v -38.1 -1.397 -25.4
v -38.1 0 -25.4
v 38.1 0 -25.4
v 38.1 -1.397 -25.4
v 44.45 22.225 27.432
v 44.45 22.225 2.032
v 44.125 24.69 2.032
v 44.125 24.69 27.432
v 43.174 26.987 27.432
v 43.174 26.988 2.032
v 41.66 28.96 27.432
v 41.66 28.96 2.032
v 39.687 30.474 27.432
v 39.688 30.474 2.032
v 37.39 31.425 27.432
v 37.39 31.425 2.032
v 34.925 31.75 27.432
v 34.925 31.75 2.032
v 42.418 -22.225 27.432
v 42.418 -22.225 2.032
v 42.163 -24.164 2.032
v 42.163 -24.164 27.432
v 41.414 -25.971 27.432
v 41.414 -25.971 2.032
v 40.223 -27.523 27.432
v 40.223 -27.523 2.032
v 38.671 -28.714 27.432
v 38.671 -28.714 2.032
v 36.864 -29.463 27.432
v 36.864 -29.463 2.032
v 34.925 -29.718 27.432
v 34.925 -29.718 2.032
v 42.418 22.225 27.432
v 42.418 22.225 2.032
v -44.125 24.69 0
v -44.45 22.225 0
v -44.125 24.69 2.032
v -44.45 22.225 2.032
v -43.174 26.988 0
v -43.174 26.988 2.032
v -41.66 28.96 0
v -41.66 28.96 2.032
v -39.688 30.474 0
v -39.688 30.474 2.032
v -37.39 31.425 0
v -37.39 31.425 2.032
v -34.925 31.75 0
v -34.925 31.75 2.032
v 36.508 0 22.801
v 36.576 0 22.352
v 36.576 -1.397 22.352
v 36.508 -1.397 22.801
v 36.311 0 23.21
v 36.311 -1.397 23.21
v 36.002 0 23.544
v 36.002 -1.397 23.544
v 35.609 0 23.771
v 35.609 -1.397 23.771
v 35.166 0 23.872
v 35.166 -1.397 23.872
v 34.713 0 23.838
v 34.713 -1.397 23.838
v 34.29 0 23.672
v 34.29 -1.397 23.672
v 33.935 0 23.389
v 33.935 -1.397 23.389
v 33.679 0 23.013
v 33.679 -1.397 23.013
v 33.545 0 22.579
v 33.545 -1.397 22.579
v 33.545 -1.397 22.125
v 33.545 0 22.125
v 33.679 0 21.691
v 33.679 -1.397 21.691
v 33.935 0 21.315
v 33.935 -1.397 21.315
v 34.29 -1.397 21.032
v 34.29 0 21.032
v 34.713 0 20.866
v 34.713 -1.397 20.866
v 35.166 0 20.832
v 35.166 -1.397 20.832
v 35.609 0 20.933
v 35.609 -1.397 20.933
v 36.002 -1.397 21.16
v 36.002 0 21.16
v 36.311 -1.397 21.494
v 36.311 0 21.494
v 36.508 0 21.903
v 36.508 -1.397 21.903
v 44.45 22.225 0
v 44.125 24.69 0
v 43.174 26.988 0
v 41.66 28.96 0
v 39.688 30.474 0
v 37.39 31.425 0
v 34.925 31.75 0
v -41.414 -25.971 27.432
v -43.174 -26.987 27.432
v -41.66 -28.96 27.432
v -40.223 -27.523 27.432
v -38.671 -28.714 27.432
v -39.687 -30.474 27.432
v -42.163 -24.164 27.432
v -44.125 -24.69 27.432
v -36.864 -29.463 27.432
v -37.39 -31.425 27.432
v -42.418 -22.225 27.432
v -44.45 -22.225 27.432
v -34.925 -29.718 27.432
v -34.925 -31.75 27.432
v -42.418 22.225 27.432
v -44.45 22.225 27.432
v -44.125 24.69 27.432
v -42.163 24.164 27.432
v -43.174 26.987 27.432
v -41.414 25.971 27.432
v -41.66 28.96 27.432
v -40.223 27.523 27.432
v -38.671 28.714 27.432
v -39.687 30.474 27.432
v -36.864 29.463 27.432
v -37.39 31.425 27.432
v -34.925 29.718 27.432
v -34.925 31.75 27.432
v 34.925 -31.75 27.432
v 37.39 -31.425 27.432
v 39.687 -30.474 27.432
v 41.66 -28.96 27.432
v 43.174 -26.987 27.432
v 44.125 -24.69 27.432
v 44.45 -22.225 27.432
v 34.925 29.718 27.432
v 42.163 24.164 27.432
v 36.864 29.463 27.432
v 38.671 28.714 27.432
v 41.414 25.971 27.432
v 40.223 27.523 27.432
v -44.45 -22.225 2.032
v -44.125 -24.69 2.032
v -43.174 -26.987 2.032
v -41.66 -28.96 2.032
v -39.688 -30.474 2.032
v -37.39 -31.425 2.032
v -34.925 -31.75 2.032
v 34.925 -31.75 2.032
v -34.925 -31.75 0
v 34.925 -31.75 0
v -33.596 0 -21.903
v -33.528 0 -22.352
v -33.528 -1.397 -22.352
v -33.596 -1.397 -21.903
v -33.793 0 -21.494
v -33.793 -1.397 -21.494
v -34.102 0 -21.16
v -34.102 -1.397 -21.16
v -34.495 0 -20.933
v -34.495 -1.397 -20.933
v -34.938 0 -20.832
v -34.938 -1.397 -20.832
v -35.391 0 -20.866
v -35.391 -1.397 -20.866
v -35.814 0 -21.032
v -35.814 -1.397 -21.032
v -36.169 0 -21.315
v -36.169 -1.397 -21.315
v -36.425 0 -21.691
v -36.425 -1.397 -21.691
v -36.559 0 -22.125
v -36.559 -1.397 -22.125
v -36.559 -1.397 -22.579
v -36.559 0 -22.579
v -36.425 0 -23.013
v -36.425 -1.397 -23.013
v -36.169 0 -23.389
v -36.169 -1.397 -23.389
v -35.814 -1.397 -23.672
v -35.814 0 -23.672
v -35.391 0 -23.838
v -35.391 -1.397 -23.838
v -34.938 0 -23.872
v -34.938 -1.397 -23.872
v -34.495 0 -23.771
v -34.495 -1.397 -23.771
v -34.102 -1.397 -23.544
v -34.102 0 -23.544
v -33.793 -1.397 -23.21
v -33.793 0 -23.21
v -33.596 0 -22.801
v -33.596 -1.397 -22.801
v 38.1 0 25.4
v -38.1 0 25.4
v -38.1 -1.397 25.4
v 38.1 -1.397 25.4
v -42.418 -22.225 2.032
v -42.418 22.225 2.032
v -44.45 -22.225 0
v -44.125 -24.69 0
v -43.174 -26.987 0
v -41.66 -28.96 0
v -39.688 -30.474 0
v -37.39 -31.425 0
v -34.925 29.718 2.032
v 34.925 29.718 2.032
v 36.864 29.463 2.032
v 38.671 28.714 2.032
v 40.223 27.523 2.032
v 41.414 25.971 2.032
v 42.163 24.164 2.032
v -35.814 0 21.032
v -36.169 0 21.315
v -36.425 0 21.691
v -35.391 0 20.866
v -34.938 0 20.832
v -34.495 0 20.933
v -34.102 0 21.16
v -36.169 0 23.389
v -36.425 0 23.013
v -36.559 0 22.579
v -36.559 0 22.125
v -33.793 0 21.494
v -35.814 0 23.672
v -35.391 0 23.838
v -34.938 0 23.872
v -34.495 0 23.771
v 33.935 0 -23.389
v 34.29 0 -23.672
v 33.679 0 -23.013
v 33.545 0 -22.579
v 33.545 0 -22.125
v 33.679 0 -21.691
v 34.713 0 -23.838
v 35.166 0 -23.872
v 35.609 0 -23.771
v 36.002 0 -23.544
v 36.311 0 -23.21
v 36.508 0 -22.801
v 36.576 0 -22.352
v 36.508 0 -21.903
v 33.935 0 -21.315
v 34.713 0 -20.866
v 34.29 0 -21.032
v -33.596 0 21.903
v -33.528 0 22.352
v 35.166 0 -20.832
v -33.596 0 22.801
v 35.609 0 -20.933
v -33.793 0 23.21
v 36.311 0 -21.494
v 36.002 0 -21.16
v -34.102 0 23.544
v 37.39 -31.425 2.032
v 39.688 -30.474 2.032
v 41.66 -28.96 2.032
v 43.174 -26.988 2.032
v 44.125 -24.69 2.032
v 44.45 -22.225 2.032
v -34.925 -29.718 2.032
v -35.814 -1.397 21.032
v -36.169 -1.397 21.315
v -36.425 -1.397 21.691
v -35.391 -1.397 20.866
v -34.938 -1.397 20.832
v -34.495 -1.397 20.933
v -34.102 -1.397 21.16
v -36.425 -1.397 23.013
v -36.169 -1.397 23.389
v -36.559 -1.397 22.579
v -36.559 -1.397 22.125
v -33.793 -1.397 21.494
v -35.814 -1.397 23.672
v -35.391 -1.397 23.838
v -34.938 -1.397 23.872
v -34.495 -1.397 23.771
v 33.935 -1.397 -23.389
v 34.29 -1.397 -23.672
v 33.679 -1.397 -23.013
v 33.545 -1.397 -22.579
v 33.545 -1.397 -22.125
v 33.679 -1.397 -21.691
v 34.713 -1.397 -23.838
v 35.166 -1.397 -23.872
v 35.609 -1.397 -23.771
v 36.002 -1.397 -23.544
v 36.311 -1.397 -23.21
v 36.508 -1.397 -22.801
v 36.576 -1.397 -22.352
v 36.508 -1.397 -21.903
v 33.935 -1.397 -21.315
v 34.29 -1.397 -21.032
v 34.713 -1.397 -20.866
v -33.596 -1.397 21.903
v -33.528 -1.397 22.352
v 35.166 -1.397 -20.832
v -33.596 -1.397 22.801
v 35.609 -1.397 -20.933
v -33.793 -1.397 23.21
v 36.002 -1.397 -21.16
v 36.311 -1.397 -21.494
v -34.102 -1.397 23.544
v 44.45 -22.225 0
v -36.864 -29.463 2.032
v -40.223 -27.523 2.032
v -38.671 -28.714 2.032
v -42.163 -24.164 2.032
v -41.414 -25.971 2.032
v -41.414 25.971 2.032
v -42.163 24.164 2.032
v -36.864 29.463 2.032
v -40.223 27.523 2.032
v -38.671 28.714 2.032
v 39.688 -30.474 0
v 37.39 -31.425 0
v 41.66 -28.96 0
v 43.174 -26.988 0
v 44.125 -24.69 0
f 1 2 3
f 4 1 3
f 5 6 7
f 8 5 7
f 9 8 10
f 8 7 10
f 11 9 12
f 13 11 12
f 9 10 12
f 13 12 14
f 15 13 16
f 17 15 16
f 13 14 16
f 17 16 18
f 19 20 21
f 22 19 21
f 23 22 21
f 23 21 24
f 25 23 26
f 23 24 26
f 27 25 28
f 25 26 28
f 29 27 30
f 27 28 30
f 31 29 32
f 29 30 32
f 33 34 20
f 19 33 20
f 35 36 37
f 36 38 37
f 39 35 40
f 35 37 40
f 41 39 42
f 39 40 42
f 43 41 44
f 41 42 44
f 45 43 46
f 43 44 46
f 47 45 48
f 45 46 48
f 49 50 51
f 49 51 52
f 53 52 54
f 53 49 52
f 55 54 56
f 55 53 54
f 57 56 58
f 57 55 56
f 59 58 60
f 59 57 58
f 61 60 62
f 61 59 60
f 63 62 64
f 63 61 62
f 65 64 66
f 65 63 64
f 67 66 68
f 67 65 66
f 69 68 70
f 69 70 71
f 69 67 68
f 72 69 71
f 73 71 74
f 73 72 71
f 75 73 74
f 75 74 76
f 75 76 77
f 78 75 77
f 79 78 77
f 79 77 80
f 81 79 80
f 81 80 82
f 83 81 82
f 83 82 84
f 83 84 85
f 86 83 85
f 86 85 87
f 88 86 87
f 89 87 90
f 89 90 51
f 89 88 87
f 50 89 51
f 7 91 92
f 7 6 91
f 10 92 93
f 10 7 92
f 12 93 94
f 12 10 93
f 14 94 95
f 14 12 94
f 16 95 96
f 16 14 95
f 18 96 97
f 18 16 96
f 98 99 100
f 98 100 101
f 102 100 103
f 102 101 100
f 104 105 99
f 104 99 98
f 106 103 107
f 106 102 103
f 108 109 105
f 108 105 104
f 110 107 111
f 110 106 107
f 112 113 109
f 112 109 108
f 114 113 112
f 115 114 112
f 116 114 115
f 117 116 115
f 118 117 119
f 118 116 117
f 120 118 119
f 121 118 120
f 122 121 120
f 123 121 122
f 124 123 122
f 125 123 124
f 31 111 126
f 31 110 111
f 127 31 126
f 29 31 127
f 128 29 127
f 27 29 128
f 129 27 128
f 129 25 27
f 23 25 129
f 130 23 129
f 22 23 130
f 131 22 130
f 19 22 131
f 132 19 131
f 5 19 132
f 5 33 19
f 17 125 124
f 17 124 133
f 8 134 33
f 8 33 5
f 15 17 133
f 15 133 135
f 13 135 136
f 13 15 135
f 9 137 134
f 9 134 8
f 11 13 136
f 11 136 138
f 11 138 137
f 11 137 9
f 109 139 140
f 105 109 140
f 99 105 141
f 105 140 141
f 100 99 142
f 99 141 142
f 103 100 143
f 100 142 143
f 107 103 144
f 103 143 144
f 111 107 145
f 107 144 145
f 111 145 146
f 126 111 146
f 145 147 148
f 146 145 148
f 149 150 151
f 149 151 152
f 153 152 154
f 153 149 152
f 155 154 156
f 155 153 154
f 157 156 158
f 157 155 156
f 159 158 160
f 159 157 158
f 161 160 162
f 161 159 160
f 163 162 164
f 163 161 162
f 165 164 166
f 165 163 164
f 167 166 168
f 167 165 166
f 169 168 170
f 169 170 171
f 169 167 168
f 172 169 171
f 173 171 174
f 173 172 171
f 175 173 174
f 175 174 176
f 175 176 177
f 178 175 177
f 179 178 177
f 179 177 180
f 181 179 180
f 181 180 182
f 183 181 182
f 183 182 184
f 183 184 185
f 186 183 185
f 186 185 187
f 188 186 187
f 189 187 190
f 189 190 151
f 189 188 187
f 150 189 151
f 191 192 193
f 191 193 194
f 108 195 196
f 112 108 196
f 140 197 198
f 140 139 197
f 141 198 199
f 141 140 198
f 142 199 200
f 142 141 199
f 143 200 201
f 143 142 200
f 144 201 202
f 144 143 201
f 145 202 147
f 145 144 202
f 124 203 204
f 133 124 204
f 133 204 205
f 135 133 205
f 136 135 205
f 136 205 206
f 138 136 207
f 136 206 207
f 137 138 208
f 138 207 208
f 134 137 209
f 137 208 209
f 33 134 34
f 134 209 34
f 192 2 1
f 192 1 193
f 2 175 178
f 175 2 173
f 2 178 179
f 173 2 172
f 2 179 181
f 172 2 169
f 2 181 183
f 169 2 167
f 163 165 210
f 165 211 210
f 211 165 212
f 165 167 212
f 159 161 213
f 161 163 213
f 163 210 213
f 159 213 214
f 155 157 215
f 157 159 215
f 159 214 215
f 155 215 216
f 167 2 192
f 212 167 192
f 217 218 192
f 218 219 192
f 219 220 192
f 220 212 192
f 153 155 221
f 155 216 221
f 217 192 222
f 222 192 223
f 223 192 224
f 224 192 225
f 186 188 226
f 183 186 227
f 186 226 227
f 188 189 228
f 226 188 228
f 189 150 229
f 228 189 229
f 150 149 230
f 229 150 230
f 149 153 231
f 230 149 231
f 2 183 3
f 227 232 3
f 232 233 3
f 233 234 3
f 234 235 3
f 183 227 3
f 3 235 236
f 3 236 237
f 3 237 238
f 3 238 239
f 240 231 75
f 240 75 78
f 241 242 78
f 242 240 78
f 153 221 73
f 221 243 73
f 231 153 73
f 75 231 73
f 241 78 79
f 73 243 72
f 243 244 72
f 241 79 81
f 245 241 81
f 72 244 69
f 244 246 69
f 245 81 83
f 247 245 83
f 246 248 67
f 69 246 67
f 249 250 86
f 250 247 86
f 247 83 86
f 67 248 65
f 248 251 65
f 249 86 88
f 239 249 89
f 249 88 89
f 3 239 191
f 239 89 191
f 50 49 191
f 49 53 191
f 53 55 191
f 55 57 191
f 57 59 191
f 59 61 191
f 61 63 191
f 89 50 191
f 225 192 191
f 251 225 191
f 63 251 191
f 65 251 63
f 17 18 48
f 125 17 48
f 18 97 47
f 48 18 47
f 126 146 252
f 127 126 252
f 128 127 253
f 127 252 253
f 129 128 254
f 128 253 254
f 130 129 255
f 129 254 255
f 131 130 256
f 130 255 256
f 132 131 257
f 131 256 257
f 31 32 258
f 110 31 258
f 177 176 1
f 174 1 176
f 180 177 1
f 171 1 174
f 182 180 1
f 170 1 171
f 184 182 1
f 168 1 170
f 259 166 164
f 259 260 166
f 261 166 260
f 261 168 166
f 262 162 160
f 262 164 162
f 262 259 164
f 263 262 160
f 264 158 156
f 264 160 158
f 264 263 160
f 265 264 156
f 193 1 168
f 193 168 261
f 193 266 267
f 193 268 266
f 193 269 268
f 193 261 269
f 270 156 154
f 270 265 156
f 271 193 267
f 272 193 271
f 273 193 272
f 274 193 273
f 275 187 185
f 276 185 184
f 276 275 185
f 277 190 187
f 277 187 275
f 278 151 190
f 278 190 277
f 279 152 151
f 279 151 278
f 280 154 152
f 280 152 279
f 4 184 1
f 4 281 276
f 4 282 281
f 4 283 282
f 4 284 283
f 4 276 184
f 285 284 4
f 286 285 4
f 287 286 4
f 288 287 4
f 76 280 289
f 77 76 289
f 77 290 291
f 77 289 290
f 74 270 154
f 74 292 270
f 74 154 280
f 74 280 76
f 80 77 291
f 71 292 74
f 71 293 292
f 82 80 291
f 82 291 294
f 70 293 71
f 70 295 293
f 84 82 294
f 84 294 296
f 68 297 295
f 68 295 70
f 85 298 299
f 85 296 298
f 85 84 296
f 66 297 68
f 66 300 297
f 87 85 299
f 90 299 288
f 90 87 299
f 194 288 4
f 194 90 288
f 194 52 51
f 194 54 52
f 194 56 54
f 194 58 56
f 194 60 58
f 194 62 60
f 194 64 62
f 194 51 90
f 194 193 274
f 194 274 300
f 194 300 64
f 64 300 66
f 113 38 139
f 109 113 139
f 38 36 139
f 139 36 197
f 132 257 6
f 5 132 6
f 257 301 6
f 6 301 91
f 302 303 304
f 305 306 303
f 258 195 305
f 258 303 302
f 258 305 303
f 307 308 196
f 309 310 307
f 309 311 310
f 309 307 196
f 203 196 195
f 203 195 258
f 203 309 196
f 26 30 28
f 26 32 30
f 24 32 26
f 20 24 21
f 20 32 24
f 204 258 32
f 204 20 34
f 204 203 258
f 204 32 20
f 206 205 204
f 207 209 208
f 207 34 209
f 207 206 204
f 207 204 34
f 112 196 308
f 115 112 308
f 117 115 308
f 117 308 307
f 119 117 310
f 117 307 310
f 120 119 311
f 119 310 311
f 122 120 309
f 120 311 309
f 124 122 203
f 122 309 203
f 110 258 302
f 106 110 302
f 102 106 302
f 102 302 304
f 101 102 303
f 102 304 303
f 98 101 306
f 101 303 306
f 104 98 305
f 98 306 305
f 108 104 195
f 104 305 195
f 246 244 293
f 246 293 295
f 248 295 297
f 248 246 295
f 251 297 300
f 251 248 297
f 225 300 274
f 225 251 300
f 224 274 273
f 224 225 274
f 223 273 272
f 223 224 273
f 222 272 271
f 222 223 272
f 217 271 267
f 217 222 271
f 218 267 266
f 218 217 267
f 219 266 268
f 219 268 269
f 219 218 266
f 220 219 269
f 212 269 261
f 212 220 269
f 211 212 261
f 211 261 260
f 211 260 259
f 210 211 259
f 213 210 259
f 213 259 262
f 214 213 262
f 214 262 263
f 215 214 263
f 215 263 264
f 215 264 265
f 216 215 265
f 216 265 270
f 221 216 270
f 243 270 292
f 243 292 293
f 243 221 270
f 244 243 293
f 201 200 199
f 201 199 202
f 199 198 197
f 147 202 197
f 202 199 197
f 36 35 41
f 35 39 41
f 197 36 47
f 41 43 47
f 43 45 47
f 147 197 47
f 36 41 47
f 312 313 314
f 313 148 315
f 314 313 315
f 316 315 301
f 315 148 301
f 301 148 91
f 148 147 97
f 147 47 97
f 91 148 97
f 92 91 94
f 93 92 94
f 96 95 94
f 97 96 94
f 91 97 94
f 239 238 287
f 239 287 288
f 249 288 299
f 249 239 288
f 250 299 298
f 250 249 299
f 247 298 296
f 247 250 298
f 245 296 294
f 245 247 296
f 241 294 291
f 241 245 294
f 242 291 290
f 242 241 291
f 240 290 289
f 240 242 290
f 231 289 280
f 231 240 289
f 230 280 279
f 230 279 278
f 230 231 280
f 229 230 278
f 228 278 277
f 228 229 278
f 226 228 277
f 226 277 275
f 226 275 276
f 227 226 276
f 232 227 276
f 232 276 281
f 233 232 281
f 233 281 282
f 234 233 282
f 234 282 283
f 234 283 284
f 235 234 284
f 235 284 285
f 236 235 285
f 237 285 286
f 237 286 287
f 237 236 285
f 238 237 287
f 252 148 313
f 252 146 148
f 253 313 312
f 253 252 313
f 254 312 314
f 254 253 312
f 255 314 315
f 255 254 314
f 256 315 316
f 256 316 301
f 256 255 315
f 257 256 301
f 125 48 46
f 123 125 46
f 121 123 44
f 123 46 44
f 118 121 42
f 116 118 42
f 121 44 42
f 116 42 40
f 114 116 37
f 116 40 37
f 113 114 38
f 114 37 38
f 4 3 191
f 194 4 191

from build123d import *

# Parameters (mm, degrees)
F0_W     = 76.2
F0_H     = 50.8
F0_R     = 1.524
F1_DEPTH = 1.397
F2_W     = 88.9
F2_H     = 63.5
F3_DEPTH = 2.032
F4_R     = 9.525
F6_DEPTH = 25.4


with BuildPart() as f1:
    # F0 (on Front) → F1 (new body)
    with BuildSketch(Plane.XZ):
        Rectangle(F0_W, F0_H)
        with Locations((-35.052, -22.352)):
            Circle(F0_R, mode=Mode.SUBTRACT)
        with Locations((35.052, -22.352)):
            Circle(F0_R, mode=Mode.SUBTRACT)
        with Locations((-35.052, 22.352)):
            Circle(F0_R, mode=Mode.SUBTRACT)
        with Locations((35.052, 22.352)):
            Circle(F0_R, mode=Mode.SUBTRACT)
    extrude(amount=F1_DEPTH)


with BuildPart() as f3:
    # F2 (on Top) → F3 (new body)
    with BuildSketch(Plane.XY):
        Rectangle(F2_W, F2_H)
    extrude(amount=F3_DEPTH)

    # F4
    f4_edges = [f3.edges().sort_by_distance(p)[0] for p in [
        (-44.45, -31.75, 1.016),
        (44.45, -31.75, 1.016),
        (-44.45, 31.75, 1.016),
        (44.45, 31.75, 1.016),
    ]]
    fillet(f4_edges, radius=F4_R)

    # F5 (on face) → F6 (join)
    with BuildSketch(Plane.XY.offset(2.032)):
        with BuildLine():
            Line((34.925, 31.75), (-34.925, 31.75))
            ThreePointArc((-34.925, 31.75), (-41.660192, 28.960192), (-44.45, 22.225))
            Line((-44.45, 22.225), (-44.45, -22.225))
            ThreePointArc((-44.45, -22.225), (-41.660192, -28.960192), (-34.925, -31.75))
            Line((-34.925, -31.75), (34.925, -31.75))
            ThreePointArc((34.925, -31.75), (41.660192, -28.960192), (44.45, -22.225))
            Line((44.45, -22.225), (44.45, 22.225))
            ThreePointArc((44.45, 22.225), (41.660192, 28.960192), (34.925, 31.75))
        make_face()
        with BuildLine():
            ThreePointArc((-42.418, 22.225), (-40.223351, 27.523351), (-34.925, 29.718))
            Line((-34.925, 29.718), (34.925, 29.718))
            ThreePointArc((34.925, 29.718), (40.223351, 27.523351), (42.418, 22.225))
            Line((42.418, 22.225), (42.418, -22.225))
            ThreePointArc((42.418, -22.225), (40.223351, -27.523351), (34.925, -29.718))
            Line((34.925, -29.718), (-34.925, -29.718))
            ThreePointArc((-34.925, -29.718), (-40.223351, -27.523351), (-42.418, -22.225))
            Line((-42.418, -22.225), (-42.418, 22.225))
        make_face(mode=Mode.SUBTRACT)
    extrude(amount=F6_DEPTH)


solid = Compound([f1.part, f3.part])
